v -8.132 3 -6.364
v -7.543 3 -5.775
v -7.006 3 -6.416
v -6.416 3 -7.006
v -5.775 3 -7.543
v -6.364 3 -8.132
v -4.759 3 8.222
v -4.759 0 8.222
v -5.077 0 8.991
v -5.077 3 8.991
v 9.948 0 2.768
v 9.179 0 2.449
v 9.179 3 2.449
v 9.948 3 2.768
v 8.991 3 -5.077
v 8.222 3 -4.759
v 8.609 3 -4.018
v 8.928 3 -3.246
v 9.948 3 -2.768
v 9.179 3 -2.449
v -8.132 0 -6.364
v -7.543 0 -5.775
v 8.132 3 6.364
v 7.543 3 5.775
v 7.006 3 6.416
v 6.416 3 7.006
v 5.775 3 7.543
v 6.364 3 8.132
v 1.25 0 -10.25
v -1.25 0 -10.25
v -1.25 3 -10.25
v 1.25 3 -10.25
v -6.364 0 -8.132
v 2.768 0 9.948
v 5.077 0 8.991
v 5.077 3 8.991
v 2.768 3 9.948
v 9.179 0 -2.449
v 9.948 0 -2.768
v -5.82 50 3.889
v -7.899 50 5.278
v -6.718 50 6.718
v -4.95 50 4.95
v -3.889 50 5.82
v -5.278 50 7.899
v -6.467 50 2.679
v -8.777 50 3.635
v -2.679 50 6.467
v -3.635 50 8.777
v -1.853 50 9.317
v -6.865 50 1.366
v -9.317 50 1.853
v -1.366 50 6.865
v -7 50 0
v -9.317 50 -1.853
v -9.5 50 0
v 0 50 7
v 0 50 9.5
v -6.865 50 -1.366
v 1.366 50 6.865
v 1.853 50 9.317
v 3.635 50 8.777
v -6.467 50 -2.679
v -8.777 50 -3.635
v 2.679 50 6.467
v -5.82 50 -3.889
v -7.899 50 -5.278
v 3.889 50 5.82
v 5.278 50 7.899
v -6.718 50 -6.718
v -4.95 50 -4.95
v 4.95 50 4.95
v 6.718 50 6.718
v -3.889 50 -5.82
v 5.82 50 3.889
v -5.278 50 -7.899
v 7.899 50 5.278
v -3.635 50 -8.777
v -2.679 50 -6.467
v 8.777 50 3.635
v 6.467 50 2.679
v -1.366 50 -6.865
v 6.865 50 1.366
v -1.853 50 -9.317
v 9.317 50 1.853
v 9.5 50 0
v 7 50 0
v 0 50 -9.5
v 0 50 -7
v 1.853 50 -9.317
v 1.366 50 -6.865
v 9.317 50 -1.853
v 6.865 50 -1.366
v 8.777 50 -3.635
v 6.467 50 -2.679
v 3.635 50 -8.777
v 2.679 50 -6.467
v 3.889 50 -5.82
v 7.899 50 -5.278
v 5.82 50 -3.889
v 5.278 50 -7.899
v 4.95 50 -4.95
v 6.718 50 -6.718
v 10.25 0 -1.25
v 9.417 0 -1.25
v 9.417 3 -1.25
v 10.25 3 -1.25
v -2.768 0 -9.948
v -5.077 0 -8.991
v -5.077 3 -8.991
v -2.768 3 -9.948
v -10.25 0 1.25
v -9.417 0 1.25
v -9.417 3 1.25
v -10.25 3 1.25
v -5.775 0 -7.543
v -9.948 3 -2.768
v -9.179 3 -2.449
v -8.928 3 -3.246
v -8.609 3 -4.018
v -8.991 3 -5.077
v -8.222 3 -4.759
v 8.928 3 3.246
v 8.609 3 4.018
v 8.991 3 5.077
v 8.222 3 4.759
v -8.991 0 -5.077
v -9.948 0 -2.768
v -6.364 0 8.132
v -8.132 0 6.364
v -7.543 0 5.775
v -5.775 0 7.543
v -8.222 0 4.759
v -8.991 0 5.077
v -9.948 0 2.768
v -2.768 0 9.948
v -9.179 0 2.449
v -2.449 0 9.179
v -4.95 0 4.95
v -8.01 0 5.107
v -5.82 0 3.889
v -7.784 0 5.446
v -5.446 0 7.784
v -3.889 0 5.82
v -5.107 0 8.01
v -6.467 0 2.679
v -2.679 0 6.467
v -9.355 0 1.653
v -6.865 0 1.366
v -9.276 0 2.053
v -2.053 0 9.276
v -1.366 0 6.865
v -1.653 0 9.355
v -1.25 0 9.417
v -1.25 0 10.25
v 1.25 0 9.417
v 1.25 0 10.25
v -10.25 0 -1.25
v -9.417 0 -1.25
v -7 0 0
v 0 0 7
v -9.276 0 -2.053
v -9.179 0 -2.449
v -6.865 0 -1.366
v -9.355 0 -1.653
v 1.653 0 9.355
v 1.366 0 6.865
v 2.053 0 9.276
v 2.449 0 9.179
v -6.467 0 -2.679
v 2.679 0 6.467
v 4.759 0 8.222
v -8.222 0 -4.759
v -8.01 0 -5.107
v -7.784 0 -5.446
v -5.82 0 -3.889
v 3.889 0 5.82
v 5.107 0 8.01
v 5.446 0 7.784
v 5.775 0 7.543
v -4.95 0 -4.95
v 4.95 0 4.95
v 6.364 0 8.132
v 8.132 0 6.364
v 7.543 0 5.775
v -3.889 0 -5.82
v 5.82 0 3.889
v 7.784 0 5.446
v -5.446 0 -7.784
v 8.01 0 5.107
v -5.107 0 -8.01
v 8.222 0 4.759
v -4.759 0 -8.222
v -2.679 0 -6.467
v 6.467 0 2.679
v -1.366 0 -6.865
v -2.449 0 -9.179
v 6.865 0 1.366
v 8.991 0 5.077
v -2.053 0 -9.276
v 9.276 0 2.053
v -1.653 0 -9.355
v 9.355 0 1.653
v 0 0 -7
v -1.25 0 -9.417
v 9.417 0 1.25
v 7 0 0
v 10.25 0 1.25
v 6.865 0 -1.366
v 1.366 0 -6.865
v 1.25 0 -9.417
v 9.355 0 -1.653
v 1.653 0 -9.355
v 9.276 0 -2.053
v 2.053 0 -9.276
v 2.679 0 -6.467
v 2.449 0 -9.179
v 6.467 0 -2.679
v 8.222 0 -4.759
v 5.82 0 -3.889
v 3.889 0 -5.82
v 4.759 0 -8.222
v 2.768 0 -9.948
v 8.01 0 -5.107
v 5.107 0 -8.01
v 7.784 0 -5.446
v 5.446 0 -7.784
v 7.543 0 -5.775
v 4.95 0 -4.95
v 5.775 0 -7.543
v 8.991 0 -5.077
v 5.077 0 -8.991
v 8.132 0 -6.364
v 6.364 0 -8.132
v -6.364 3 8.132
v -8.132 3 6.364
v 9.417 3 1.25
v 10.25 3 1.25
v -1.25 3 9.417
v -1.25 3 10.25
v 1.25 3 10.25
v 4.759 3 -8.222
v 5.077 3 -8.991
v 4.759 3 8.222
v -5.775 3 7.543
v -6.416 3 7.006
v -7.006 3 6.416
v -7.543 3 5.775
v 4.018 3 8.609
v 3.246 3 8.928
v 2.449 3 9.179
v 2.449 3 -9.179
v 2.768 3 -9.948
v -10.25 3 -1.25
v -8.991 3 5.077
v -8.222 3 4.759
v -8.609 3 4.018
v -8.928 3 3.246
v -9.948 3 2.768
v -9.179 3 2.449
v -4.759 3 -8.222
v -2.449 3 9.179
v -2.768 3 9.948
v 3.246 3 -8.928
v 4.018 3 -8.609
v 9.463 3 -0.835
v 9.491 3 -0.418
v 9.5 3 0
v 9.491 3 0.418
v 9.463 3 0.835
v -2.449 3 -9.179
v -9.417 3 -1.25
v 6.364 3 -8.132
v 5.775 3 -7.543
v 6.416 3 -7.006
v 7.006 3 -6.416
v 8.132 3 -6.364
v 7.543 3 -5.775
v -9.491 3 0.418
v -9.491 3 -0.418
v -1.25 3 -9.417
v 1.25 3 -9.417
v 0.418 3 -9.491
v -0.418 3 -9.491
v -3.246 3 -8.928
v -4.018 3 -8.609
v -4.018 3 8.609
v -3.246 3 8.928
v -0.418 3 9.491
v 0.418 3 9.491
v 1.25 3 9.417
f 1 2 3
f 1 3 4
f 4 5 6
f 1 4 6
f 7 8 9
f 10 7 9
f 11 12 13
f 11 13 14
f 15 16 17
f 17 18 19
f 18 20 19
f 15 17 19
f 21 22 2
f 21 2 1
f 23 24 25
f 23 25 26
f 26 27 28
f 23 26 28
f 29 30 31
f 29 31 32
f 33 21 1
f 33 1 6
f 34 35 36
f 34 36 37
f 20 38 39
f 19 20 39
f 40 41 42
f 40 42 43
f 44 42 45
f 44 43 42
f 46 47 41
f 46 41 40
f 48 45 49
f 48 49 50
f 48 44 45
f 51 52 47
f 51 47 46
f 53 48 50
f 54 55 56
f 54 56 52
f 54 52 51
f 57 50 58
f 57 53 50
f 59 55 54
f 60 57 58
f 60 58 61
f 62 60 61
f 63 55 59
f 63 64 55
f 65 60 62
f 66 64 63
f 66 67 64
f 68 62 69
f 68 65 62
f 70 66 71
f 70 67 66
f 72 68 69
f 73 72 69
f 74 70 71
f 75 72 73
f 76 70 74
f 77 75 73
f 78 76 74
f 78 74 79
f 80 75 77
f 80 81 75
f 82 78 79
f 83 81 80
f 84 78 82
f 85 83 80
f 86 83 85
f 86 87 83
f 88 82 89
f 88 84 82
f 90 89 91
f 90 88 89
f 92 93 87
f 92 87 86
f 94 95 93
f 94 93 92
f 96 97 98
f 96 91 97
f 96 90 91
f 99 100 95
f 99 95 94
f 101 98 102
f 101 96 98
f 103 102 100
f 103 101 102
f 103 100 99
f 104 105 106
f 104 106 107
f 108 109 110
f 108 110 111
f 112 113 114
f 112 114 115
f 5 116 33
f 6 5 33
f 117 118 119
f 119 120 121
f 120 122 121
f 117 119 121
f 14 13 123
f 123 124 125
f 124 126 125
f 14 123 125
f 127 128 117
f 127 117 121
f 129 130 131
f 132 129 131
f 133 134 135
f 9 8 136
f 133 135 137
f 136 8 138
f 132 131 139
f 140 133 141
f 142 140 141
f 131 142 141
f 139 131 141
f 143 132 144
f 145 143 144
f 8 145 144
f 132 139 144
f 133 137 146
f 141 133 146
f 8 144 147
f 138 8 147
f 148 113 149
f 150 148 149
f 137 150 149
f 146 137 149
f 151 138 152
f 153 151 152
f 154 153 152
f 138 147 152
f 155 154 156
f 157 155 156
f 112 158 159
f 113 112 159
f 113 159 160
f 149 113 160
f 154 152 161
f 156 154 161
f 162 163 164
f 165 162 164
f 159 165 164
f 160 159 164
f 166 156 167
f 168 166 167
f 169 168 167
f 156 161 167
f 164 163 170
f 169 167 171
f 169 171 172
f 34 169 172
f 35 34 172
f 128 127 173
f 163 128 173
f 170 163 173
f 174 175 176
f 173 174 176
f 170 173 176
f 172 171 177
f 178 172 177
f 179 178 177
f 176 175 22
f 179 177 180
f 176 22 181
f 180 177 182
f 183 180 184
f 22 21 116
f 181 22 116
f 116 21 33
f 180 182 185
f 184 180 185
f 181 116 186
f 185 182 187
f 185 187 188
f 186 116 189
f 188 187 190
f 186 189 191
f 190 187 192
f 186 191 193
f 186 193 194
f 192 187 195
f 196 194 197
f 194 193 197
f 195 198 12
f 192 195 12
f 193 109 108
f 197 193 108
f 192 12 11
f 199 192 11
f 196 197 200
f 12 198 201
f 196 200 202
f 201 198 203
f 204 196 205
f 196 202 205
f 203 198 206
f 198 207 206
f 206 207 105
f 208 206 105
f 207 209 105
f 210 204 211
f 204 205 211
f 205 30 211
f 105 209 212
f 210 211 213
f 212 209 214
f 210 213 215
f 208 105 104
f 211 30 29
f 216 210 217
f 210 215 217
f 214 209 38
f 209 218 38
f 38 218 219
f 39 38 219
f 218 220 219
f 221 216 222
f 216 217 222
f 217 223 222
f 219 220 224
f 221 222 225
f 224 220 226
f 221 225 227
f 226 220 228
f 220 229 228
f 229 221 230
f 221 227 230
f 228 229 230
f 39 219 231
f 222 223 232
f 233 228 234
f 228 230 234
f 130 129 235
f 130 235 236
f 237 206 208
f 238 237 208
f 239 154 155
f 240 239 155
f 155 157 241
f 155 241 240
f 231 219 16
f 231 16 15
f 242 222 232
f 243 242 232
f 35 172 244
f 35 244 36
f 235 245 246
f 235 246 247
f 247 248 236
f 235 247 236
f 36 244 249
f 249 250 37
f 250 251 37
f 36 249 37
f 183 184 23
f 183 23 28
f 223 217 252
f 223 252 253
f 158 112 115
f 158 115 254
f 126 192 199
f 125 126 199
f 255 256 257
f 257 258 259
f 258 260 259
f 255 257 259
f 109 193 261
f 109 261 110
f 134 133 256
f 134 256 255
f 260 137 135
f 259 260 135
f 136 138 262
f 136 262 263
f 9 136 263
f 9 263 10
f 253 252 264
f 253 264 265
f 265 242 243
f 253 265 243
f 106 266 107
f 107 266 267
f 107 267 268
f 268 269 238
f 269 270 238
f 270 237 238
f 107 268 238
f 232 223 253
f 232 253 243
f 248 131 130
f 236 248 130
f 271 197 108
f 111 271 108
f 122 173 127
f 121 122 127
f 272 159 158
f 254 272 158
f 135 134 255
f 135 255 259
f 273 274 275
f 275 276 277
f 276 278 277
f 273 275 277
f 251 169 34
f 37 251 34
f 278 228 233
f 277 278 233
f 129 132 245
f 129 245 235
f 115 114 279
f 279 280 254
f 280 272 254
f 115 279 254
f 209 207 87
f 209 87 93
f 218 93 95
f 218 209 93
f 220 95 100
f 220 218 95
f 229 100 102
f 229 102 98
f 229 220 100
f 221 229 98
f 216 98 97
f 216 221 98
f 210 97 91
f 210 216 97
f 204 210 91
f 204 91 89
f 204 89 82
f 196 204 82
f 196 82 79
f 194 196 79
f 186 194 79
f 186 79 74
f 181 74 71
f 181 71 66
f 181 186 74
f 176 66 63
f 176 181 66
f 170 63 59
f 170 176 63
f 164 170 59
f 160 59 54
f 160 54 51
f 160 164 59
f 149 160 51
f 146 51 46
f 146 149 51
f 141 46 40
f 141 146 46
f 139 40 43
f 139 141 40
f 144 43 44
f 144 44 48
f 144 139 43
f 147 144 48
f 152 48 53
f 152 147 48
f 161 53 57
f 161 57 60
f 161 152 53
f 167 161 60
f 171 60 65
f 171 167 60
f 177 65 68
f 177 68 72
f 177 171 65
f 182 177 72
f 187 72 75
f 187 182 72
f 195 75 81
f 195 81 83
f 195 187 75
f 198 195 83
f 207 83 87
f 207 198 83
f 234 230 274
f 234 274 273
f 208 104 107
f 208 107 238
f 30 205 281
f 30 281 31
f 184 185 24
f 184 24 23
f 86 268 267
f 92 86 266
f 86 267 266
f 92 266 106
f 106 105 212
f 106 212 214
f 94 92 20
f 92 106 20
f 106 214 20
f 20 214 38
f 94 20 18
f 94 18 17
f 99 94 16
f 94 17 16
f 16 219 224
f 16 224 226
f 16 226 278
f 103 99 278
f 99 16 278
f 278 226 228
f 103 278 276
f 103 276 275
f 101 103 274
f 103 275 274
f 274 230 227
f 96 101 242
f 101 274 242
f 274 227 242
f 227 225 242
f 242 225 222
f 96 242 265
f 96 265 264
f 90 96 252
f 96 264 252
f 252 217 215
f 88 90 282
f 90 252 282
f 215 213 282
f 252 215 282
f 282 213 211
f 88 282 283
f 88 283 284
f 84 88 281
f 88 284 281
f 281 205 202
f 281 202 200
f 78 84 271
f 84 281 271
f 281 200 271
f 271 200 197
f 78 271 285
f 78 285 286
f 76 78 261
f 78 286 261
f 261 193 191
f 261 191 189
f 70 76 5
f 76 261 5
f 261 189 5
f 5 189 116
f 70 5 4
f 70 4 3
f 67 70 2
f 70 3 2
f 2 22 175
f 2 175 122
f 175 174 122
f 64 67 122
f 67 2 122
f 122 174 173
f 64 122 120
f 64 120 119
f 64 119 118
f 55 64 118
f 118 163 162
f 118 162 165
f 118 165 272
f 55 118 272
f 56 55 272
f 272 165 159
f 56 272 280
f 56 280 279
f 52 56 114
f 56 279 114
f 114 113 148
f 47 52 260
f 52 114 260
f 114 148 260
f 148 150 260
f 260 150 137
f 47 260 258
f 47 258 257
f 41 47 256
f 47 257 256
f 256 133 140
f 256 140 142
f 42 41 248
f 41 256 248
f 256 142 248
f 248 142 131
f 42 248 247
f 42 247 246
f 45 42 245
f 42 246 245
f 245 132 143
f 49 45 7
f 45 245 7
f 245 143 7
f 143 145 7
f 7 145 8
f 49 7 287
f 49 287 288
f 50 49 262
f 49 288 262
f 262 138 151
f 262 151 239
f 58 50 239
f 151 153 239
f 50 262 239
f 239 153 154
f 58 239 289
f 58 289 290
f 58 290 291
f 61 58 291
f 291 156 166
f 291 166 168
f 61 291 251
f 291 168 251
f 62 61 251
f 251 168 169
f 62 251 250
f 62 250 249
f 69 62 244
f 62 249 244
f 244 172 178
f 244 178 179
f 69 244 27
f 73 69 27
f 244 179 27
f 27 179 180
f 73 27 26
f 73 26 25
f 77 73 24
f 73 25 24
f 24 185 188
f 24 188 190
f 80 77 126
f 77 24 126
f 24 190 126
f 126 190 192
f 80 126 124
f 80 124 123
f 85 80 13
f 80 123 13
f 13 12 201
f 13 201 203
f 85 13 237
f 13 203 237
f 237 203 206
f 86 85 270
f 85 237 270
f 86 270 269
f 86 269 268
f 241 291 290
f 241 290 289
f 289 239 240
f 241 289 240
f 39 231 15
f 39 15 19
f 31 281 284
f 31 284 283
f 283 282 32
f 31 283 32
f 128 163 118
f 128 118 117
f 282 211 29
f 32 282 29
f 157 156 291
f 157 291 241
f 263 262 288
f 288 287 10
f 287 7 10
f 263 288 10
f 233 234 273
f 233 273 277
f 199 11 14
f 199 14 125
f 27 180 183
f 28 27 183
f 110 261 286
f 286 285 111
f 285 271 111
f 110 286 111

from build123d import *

# Parameters (mm, degrees)
SKETCH_1_R               = 9.5
SKETCH_1_R_2             = 7
EXTRUDE_1_DEPTH          = 50
SKETCH_2_W               = 1.5
SKETCH_2_H               = 2.5
EXTRUDE_2_DEPTH          = 3
PATTERN_CIRCULAR_1_COUNT = 16


with BuildPart() as part:
    # 草图1 → 凸台-拉伸1 (new body)
    with BuildSketch(Plane(origin=(0, 0, 0), x_dir=(1, 0, 0), z_dir=(0, 1, 0))):
        Circle(SKETCH_1_R)
        Circle(SKETCH_1_R_2, mode=Mode.SUBTRACT)
    extrude(amount=EXTRUDE_1_DEPTH)

    # 草图2 → 凸台-拉伸2 (add)
    with BuildSketch(Plane(origin=(0, 0, 0), x_dir=(-1, 0, 0), z_dir=(0, -1, 0))):
        with Locations((9.5, 0)):
            Rectangle(SKETCH_2_W, SKETCH_2_H)
    extrude_2 = extrude(amount=-EXTRUDE_2_DEPTH)

    # 阵列(圆周)1: 凸台-拉伸2 ×16 about axis
    pattern_circular_1_axis = Axis((0, 0, 0), (0, 1, 0))
    for i in range(1, PATTERN_CIRCULAR_1_COUNT):
        add(extrude_2.rotate(pattern_circular_1_axis, i * 360 / PATTERN_CIRCULAR_1_COUNT))


solid = part.part
